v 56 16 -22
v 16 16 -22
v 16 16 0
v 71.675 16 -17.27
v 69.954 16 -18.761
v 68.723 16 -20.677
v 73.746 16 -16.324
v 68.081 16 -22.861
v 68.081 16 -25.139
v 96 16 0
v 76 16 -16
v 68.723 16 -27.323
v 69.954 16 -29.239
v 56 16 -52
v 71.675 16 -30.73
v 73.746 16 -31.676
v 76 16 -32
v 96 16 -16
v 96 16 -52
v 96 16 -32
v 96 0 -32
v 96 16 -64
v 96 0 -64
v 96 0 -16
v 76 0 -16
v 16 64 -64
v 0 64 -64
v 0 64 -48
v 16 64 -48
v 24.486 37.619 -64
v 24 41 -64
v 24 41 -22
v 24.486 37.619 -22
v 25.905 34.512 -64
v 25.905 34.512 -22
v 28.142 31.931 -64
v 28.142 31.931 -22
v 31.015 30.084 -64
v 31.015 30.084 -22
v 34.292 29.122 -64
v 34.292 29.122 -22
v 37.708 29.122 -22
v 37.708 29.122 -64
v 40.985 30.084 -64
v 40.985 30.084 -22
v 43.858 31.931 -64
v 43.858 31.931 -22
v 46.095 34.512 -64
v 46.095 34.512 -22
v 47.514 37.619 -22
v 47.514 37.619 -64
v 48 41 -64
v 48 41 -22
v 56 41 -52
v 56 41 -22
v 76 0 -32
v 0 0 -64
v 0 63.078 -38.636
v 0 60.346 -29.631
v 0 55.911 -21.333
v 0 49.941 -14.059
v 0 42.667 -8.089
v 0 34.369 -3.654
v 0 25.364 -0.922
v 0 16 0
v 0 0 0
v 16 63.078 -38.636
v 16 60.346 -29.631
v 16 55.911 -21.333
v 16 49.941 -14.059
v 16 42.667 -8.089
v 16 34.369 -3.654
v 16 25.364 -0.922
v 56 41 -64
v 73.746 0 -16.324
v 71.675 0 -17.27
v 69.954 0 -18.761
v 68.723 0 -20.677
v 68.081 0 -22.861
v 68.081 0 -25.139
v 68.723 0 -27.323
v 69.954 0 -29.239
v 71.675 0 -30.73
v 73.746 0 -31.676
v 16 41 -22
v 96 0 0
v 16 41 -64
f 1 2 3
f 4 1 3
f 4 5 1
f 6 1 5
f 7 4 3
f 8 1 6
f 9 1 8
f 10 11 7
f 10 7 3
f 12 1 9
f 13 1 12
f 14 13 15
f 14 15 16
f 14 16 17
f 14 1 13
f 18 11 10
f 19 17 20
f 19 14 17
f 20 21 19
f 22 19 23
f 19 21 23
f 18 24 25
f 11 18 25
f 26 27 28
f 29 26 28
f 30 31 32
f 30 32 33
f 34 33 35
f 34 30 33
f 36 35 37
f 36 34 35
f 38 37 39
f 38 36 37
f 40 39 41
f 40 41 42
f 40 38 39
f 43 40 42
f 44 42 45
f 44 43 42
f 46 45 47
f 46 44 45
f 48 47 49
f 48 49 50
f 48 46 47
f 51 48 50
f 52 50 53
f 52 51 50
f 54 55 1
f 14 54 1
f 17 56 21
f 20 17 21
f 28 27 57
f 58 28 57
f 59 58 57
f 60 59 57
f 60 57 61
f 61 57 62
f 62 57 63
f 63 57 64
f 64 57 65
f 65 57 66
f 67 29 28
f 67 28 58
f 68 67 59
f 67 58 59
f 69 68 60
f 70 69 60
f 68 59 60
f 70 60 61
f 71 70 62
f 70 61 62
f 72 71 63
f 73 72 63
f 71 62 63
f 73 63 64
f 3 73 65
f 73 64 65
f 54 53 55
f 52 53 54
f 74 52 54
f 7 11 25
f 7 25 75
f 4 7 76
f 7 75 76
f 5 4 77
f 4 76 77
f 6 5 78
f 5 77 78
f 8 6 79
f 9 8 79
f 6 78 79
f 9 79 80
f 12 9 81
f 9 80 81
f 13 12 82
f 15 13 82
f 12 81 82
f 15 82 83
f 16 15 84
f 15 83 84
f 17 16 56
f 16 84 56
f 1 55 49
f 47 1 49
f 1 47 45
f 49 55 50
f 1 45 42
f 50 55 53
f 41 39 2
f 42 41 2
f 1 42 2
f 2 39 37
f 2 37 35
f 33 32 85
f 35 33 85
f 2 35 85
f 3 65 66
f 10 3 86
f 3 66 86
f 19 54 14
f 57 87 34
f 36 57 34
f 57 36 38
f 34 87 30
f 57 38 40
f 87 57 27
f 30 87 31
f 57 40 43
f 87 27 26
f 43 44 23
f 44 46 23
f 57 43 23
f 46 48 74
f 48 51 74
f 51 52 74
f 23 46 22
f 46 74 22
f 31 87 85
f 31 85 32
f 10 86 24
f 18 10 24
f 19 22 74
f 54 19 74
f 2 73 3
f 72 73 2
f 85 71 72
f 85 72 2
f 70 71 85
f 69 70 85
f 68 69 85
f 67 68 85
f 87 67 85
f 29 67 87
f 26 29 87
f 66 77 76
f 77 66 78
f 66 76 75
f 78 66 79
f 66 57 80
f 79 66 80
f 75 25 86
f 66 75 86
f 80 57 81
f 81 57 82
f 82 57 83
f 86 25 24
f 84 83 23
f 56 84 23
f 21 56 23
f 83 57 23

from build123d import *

# Parameters (mm, degrees)
BOSS_EXTRUDE1_DEPTH = 16
BOSS_EXTRUDE2_DEPTH = 16
BOSS_EXTRUDE3_DEPTH = 42
BOSS_EXTRUDE4_DEPTH = 12


with BuildPart() as part:
    # Sketch1 → Boss-Extrude1 (new body)
    with BuildSketch(Plane(origin=(0, 0, 0), x_dir=(1, 0, 0), z_dir=(0, 1, 0))):
        with BuildLine():
            Line((0, 64), (0, 0))
            Line((0, 0), (96, 0))
            Line((96, 0), (96, 16))
            Line((96, 16), (76, 16))
            ThreePointArc((76, 16), (68, 24), (76, 32))
            Line((76, 32), (96, 32))
            Line((96, 32), (96, 64))
            Line((96, 64), (0, 64))
        make_face()
    extrude(amount=BOSS_EXTRUDE1_DEPTH)

    # Sketch2 → Boss-Extrude2 (add)
    with BuildSketch(Plane.ZY):
        with BuildLine():
            Line((0, 0), (-64, 0))
            Line((-64, 0), (-64, 64))
            Line((-64, 64), (-48, 64))
            ThreePointArc((-48, 64), (-14.058874503, 49.941125497), (0, 16))
            Line((0, 16), (0, 0))
        make_face()
    extrude(amount=-BOSS_EXTRUDE2_DEPTH)

    # Sketch3 → Boss-Extrude3 (add)
    with BuildSketch(Plane(origin=(0, 0, -64), x_dir=(-1, 0, 0), z_dir=(0, 0, -1))):
        with BuildLine():
            Line((-56, 16), (-16, 16))
            Line((-16, 16), (-16, 41))
            Line((-16, 41), (-24, 41))
            ThreePointArc((-24, 41), (-36, 29), (-48, 41))
            Line((-48, 41), (-56, 41))
            Line((-56, 41), (-56, 16))
        make_face()
    extrude(amount=-BOSS_EXTRUDE3_DEPTH)

    # Sketch4 → Boss-Extrude4 (add)
    with BuildSketch(Plane(origin=(0, 0, -64), x_dir=(-1, 0, 0), z_dir=(0, 0, -1))):
        Polygon((-96, 16), (-56, 41), (-56, 16), align=None)
    extrude(amount=-BOSS_EXTRUDE4_DEPTH)


solid = part.part
